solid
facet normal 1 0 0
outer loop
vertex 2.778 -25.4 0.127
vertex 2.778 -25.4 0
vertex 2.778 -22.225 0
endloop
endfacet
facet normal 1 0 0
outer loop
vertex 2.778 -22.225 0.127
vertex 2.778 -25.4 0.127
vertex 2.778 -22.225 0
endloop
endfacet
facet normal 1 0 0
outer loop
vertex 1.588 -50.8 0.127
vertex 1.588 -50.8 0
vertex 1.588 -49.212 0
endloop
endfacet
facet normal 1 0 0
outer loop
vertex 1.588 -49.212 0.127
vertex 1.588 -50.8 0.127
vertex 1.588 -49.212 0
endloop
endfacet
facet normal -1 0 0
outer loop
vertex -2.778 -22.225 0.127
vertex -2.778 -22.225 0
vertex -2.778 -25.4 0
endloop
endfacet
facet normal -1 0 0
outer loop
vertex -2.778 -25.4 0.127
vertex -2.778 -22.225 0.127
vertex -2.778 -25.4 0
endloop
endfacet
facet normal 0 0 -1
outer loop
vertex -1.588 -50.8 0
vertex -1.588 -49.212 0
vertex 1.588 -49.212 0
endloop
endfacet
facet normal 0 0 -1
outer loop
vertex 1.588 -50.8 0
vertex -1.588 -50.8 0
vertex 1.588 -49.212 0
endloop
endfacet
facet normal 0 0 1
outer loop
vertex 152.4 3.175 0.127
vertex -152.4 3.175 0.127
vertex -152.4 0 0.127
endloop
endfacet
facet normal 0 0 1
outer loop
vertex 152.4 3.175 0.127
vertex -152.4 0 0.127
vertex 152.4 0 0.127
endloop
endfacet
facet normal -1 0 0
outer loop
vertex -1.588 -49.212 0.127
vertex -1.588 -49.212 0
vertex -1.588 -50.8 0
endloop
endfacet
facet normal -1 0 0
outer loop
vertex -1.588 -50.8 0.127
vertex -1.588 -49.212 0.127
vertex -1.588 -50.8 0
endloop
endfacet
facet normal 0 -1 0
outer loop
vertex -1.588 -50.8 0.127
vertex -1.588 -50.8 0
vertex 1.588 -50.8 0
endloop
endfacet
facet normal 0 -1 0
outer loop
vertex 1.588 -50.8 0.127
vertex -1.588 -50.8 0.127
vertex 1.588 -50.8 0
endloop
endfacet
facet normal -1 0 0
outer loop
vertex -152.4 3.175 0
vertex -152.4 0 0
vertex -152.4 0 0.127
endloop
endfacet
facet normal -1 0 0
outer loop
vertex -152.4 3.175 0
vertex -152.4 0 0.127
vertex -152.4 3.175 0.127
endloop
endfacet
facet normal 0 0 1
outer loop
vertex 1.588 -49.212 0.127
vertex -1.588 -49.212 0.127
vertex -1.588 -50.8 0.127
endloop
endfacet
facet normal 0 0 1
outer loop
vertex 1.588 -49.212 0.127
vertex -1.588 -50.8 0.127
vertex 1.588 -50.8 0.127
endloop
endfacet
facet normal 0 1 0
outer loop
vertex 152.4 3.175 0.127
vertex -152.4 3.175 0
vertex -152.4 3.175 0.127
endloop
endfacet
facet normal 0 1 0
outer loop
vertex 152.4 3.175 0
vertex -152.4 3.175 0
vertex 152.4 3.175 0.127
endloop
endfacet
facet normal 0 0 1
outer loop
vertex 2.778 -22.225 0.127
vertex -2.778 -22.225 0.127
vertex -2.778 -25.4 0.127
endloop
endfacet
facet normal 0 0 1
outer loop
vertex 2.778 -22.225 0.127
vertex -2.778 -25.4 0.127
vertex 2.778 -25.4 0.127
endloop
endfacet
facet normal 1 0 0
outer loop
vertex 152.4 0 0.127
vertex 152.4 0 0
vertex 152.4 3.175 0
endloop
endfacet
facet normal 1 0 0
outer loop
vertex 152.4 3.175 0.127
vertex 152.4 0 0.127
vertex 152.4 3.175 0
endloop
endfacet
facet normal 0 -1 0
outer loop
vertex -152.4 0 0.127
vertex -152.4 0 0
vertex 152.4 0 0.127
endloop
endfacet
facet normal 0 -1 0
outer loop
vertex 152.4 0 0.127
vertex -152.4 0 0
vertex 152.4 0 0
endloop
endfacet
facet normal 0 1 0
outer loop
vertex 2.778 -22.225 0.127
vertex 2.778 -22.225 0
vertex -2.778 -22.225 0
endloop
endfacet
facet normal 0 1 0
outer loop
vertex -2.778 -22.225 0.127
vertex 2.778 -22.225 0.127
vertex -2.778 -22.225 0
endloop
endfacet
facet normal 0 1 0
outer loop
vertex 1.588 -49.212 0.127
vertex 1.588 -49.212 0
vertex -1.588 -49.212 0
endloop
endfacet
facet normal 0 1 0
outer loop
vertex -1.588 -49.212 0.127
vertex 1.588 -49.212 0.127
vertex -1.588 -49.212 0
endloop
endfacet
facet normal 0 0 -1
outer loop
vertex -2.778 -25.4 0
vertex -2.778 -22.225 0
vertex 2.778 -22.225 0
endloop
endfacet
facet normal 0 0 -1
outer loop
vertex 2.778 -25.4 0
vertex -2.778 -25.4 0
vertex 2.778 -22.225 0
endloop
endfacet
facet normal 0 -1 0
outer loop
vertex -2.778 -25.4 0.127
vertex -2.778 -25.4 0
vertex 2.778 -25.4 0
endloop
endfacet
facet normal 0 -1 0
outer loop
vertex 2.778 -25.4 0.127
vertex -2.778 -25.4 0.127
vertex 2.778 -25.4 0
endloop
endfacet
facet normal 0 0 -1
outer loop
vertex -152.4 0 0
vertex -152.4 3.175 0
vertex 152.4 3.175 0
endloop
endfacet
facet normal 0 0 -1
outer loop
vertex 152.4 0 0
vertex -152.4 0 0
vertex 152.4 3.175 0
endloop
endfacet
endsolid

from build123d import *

# Parameters (mm, degrees)
F0_W     = 304.8
F0_H     = 3.175
F1_DEPTH = 0.127
F3_DEPTH = 0.127
F5_DEPTH = 0.127


with BuildPart() as f1:
    # F0 (on Top) → F1 (new body)
    with BuildSketch(Plane.XY):
        with Locations((0, 1.5875)):
            Rectangle(F0_W, F0_H)
    extrude(amount=F1_DEPTH)


with BuildPart() as f3:
    # F2 (on Top) → F3 (new body)
    with BuildSketch(Plane.XY):
        Polygon((2.778125, -22.225), (0, -22.225), (-2.778125, -22.225), (-2.778125, -25.4), (0, -25.4), (2.778125, -25.4), align=None)
    extrude(amount=F3_DEPTH)


with BuildPart() as f5:
    # F4 (on Top) → F5 (new body)
    with BuildSketch(Plane.XY):
        Polygon((1.5875, -49.2125), (0, -49.2125), (-1.5875, -49.2125), (-1.5875, -50.8), (0, -50.8), (1.5875, -50.8), align=None)
    extrude(amount=F5_DEPTH)


solid = Compound([f1.part, f3.part, f5.part])
